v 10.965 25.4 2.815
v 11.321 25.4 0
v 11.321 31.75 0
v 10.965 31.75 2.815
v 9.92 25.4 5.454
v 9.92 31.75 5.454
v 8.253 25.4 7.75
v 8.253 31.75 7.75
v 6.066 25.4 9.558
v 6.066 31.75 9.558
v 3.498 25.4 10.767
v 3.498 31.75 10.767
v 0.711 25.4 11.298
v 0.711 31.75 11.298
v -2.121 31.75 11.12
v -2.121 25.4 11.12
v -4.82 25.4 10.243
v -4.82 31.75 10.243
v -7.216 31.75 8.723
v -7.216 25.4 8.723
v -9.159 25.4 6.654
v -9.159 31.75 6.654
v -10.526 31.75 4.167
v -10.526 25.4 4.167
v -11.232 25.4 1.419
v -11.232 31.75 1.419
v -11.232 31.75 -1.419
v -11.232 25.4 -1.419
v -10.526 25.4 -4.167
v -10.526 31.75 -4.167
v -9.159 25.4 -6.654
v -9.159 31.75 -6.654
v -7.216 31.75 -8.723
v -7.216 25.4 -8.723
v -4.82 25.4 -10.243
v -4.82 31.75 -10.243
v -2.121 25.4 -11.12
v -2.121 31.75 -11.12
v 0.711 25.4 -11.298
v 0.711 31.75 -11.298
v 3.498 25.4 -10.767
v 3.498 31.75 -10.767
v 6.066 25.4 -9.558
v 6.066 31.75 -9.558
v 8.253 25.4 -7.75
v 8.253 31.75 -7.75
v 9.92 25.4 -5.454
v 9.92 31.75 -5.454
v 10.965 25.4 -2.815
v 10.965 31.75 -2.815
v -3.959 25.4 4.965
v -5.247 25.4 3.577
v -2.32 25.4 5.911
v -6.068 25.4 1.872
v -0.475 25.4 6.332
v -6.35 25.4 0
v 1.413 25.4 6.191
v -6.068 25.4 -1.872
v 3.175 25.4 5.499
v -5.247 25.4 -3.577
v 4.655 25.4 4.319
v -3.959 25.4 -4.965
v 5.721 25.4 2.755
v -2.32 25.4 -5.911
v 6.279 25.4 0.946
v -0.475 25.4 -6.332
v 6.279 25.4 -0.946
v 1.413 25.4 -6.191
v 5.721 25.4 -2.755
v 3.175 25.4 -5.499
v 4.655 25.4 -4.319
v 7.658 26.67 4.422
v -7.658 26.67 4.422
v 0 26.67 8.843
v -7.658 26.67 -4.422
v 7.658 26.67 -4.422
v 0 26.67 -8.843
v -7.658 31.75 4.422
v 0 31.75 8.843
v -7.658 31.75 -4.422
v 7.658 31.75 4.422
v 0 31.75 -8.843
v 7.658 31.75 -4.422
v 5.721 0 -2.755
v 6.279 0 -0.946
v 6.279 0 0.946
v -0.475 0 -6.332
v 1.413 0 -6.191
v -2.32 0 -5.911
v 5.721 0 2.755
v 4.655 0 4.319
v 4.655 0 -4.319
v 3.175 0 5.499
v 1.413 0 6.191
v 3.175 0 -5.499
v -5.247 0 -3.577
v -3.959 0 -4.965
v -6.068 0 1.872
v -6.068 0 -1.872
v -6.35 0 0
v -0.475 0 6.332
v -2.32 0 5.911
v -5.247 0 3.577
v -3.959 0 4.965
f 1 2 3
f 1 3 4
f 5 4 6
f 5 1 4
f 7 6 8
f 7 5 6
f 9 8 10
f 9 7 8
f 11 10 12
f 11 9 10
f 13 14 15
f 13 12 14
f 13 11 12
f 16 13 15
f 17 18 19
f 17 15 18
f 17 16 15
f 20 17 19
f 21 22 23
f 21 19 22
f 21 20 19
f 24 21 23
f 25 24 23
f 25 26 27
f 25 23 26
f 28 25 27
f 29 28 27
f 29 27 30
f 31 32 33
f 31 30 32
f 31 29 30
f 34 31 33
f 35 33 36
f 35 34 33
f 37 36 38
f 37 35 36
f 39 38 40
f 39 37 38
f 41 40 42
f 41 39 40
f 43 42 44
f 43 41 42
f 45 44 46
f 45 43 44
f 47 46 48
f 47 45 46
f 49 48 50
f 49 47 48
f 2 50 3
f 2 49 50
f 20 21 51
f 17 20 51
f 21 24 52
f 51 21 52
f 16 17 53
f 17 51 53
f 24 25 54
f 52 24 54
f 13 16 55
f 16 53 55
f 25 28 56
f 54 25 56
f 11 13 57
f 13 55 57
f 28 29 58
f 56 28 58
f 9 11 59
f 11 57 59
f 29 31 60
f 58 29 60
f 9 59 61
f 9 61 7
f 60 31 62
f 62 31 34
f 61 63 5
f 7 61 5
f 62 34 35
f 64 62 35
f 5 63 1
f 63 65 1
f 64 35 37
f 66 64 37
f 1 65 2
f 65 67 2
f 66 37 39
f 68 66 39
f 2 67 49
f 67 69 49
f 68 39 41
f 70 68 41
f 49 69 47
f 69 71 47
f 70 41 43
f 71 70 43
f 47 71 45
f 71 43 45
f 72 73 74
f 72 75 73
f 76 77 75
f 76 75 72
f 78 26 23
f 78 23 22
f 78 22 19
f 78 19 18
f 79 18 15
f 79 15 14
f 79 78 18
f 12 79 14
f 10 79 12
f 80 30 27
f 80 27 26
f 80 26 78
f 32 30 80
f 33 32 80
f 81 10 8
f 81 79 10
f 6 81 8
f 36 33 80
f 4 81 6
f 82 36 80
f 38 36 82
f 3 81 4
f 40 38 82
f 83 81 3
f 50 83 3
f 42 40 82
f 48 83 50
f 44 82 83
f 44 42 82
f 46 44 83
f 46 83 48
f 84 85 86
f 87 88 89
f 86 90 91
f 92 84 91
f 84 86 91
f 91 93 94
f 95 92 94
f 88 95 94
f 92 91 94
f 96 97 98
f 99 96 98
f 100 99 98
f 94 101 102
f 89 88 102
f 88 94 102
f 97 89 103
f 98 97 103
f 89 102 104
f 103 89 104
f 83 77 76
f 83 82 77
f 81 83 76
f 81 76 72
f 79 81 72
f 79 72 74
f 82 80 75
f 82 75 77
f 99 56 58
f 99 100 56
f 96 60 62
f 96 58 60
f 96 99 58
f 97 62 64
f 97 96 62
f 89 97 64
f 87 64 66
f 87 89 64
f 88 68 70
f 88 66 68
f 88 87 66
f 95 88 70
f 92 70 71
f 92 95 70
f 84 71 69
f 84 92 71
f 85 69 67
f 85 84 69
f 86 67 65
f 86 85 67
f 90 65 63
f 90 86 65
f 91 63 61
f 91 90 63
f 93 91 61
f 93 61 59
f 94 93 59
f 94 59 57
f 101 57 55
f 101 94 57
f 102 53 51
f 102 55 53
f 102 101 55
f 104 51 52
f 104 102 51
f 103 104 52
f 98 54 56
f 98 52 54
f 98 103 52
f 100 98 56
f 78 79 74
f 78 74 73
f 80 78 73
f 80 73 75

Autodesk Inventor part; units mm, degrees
ref_plane "YZ Plane" through (0, 0, 0) normal (1, 0, 0) x (0, 1, 0)
ref_plane "XZ Plane" through (0, 0, 0) normal (0, 1, 0) x (-1, 0, 0)
ref_plane "XY Plane" through (0, 0, 0) normal (0, 0, 1) x (1, 0, 0)
sketch "Sketch1" plane through (0, 0, 0) normal (0, 1, 0) x (-1, 0, 0)
  circle A0 centre (0, 0) radius 6.35
  dimension "d0" = 12.7
extrude "Extrusion1" add sketch "Sketch1" along normal blind 25.4
thread "Thread1" size "1/2-13 UNC" class "2A" standard "ANSI Unified Screw Threads" full length
sketch "Sketch2" plane through (0, 25.4, 0) normal (0, 1, 0) x (1, 0, 0)
  circle A0 centre (0, 0) radius 11.3208
extrude "Extrusion2" add sketch "Sketch2" along normal blind 6.35
sketch "Sketch3" plane through (0, 31.75, 0) normal (0, 1, 0) x (1, 0, 0)
  line L0 (0, 8.8433) -> (7.6585, 4.4216)
  line L1 (7.6585, 4.4216) -> (7.6585, -4.4216)
  line L2 (7.6585, -4.4216) -> (0, -8.8433)
  line L3 (0, -8.8433) -> (-7.6585, -4.4216)
  line L4 (-7.6585, -4.4216) -> (-7.6585, 4.4216)
  line L5 (-7.6585, 4.4216) -> (0, 8.8433)
  point P0 (0, 0)
  point P1 (0, 0)
extrude "Extrusion3" cut sketch "Sketch3" against normal blind 5.08
properties part number "bolttest"
